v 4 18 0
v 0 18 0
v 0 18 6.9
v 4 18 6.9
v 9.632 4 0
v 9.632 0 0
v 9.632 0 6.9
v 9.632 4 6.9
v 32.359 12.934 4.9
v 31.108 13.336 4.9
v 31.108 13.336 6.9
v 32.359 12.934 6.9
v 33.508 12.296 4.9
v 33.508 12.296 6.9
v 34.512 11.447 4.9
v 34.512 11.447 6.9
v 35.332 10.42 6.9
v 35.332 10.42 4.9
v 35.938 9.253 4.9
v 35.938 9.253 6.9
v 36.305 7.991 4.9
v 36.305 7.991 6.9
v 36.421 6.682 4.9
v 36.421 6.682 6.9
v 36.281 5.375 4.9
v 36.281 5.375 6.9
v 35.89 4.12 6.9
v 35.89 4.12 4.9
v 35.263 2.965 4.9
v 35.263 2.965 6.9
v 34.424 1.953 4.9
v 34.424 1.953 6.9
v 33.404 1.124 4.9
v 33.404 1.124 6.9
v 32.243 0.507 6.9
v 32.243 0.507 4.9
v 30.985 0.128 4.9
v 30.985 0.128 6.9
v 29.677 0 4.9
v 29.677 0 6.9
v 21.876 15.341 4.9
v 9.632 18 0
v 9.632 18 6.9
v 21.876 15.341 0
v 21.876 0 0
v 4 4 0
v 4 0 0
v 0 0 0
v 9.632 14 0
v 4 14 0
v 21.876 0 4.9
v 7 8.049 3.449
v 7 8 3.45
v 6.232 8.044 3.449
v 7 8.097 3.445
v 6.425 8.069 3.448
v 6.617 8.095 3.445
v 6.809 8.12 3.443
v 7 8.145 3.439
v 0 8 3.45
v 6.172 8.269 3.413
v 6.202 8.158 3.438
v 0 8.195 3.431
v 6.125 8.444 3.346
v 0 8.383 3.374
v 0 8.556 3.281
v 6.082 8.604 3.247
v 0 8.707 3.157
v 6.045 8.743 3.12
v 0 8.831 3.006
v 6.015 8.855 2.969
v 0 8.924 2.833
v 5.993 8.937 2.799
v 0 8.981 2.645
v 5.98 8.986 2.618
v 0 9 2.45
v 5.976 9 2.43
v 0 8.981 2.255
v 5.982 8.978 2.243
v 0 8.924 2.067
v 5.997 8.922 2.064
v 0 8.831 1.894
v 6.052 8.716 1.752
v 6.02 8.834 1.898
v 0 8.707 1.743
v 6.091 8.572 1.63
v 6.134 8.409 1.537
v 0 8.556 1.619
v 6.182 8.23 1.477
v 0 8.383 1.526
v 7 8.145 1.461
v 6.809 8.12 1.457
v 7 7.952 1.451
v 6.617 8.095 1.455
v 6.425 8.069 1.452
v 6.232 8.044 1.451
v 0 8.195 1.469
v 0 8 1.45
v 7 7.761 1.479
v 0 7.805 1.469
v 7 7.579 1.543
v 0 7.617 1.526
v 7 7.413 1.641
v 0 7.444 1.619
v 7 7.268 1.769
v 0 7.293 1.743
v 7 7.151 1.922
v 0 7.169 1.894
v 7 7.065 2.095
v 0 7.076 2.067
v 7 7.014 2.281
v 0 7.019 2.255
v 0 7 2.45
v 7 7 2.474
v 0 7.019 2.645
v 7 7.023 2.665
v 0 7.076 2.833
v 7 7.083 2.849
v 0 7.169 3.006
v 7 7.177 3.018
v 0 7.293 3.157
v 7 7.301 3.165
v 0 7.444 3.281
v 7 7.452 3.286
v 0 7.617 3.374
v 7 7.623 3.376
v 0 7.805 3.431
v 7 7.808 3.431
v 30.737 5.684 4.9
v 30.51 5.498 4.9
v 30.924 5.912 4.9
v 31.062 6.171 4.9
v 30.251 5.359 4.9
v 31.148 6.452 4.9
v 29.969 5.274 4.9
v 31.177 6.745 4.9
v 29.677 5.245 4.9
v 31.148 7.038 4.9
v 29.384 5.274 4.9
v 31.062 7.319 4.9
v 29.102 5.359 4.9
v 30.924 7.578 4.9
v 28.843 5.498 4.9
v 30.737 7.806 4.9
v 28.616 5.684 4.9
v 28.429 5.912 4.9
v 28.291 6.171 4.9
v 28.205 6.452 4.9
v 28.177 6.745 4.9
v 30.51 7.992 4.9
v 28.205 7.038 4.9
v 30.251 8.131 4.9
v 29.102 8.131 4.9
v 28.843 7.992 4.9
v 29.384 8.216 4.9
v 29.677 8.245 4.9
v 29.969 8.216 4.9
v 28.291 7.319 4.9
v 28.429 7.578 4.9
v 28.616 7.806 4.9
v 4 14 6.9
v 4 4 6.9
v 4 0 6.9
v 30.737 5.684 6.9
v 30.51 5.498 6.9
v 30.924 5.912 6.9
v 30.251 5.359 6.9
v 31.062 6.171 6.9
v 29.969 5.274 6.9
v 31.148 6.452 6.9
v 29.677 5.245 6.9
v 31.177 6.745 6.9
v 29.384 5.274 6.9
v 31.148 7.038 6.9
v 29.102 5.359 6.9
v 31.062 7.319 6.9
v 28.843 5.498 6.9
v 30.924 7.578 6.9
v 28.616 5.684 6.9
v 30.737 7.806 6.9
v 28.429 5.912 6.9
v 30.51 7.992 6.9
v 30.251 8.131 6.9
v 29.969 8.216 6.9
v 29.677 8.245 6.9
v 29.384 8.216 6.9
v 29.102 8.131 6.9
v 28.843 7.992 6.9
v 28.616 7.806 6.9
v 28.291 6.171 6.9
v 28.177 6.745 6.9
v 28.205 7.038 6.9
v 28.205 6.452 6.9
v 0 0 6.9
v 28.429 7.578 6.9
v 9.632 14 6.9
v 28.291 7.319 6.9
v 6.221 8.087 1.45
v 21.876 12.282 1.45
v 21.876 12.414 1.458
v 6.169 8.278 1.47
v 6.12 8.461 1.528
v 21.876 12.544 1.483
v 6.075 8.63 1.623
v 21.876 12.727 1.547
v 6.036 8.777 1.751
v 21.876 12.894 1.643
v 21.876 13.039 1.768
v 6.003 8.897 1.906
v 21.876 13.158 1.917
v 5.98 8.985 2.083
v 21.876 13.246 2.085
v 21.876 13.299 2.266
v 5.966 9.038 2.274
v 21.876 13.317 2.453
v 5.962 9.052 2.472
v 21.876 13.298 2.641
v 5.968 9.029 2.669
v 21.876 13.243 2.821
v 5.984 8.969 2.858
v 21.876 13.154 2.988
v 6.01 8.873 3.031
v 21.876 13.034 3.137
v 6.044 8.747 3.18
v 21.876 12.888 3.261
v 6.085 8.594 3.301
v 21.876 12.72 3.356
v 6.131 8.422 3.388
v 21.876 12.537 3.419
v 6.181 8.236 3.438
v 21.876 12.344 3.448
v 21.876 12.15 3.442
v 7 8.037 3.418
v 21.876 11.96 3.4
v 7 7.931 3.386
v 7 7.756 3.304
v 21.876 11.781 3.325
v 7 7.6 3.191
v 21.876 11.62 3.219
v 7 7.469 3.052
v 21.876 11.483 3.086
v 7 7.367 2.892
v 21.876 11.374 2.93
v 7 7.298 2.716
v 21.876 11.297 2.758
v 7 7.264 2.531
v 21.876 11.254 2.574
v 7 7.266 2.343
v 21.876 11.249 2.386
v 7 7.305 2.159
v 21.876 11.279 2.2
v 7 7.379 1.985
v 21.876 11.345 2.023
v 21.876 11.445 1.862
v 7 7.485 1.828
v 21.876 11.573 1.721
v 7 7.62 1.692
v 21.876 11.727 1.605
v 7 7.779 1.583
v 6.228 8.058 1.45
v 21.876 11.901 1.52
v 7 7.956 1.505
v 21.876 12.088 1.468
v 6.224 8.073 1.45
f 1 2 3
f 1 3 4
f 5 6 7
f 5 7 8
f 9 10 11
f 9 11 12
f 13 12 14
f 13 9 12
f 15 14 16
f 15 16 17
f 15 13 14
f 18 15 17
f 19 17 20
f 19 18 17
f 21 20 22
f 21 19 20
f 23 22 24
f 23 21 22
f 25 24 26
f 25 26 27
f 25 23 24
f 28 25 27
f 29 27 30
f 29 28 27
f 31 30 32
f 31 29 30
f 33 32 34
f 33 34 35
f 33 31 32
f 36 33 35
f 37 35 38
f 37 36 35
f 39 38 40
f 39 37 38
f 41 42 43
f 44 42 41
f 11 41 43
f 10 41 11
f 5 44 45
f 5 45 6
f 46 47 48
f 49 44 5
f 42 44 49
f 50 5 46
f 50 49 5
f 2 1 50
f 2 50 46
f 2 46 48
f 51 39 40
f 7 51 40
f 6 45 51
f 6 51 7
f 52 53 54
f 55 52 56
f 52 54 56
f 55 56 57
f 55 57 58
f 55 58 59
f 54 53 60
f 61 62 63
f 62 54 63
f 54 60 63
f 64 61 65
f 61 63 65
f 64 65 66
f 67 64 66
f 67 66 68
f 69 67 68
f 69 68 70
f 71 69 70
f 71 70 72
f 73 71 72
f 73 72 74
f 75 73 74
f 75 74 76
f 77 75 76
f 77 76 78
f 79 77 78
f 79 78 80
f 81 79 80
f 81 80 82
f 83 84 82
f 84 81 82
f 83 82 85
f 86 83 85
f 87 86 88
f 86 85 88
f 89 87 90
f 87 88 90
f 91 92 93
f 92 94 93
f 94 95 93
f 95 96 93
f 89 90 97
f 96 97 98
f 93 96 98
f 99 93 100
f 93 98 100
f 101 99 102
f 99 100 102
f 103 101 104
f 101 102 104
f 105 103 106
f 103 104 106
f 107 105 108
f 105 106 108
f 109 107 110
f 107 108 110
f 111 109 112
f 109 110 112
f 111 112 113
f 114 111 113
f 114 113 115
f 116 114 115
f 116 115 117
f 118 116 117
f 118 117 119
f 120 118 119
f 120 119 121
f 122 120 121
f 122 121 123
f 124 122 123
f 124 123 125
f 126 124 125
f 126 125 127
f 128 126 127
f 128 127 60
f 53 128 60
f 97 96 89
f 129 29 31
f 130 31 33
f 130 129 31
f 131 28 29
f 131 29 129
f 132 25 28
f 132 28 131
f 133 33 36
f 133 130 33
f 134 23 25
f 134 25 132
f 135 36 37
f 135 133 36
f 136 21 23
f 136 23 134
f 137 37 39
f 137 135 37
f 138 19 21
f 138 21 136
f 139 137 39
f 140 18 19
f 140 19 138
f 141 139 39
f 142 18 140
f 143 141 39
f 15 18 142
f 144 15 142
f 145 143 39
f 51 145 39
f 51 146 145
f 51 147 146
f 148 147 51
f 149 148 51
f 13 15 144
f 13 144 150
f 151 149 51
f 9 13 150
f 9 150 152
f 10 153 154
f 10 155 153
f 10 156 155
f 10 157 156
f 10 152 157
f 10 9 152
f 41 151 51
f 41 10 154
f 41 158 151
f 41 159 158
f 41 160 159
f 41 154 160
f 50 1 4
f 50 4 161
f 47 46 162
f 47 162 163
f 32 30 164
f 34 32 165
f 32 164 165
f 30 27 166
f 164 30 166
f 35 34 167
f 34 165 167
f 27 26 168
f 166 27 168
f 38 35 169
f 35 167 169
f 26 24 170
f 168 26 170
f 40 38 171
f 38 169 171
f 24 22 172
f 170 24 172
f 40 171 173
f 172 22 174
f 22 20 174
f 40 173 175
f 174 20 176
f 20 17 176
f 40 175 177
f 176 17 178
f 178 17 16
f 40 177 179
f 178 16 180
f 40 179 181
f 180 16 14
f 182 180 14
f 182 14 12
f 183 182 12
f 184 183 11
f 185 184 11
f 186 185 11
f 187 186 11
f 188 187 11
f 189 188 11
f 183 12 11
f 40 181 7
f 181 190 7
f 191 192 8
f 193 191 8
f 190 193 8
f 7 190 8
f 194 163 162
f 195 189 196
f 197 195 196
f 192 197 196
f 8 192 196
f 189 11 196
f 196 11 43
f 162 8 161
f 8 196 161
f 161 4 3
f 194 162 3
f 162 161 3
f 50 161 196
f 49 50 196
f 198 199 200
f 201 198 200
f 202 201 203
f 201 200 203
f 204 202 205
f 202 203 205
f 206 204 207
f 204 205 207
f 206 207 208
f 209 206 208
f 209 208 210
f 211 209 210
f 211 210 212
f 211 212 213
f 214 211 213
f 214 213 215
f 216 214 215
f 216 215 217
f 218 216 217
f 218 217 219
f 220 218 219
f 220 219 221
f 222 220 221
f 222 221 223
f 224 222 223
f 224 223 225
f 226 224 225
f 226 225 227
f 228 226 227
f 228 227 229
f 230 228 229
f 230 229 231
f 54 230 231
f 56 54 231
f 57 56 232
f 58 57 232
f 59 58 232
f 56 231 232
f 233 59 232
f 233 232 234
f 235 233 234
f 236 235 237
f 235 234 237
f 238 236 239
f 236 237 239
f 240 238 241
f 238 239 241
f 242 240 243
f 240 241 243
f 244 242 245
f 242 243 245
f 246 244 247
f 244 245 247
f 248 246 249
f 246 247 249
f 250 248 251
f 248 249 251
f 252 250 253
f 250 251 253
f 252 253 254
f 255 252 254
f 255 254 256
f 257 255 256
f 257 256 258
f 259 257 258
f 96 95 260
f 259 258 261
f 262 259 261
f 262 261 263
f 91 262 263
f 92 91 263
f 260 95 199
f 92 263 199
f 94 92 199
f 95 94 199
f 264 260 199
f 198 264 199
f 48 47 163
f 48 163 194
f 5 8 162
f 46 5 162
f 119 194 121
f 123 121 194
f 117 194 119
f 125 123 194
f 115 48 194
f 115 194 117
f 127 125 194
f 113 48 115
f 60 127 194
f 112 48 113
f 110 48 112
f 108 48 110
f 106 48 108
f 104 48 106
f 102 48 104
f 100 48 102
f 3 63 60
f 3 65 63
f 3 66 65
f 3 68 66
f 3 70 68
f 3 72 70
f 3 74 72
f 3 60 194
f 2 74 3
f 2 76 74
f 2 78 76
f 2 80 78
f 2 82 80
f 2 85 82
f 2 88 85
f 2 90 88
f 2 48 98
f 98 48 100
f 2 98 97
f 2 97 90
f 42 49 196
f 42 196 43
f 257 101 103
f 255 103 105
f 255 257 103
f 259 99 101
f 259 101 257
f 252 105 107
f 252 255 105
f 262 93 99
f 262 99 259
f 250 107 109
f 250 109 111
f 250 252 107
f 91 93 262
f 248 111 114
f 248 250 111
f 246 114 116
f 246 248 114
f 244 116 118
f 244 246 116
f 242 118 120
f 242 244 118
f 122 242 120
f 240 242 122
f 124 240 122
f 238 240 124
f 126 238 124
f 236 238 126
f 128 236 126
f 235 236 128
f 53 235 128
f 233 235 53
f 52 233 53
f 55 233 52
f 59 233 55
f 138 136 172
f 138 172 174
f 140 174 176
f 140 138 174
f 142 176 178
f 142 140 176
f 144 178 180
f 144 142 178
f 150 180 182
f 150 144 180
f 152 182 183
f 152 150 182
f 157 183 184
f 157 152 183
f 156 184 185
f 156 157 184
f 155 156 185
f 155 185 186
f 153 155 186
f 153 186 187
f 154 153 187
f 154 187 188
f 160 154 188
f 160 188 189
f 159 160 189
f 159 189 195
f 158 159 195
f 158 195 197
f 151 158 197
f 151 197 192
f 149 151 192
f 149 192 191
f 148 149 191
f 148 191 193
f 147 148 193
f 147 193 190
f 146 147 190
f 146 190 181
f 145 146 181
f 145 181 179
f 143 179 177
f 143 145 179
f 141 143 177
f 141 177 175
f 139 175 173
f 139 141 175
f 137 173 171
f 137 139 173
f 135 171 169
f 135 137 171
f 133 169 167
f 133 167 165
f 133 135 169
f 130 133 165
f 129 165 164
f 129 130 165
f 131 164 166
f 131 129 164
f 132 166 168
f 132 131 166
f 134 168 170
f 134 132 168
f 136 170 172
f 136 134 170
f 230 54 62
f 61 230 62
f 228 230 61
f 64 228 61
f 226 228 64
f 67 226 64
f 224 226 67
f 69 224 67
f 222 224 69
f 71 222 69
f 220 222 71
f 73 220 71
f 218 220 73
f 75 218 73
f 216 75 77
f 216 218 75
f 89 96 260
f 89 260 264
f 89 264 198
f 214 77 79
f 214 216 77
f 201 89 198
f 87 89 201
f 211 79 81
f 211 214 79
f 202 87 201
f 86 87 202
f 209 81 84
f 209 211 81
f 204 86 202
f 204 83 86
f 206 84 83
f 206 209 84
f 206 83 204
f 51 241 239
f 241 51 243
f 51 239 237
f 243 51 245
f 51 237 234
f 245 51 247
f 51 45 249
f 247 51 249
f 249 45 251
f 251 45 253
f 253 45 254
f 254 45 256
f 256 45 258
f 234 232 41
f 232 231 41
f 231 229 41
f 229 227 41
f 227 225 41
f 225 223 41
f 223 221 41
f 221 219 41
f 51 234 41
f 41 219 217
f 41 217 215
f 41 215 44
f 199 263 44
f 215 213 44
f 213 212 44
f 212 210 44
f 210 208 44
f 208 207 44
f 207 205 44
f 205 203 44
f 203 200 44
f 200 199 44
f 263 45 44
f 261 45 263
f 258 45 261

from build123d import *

# Parameters (mm, degrees)
SKETCH1_R           = 1.5
BOSS_EXTRUDE1_DEPTH = 6.9
CUT_EXTRUDE2_DEPTH  = 4.9
SKETCH5_R           = 1
CUT_EXTRUDE3_DEPTH  = 7
SKETCH8_R           = 1
CUT_EXTRUDE5_DEPTH  = 17


with BuildPart() as part:
    # Sketch1 → Boss-Extrude1 (new body)
    with BuildSketch(Plane.XY):
        with BuildLine():
            Line((0, 0), (0, 18.000341084))
            Line((0, 18.000341084), (4, 18.000341084))
            Line((4, 18.000341084), (4, 14.000341084))
            Line((4, 14.000341084), (9.631516349, 14.000341084))
            Line((9.631516349, 14.000341084), (9.631516349, 18.000341084))
            Line((9.631516349, 18.000341084), (31.10792826, 13.336453737))
            ThreePointArc((31.10792826, 13.336453737), (36.383041872, 6.025227564), (29.676516349, 0))
            Line((29.676516349, 0), (9.631516349, 0))
            Line((9.631516349, 0), (9.631516349, 4))
            Line((9.631516349, 4), (4, 4))
            Line((4, 4), (4, 0))
            Line((4, 0), (0, 0))
        make_face()
        with Locations((29.676516349, 6.745044143)):
            Circle(SKETCH1_R, mode=Mode.SUBTRACT)
    extrude(amount=BOSS_EXTRUDE1_DEPTH)

    # Sketch4 → Cut-Extrude2 (cut)
    with BuildSketch(Plane.XY):
        with BuildLine():
            Line((21.876472206, 0), (21.876472206, 15.341186709))
            Line((21.876472206, 15.341186709), (31.10792826, 13.336453737))
            ThreePointArc((31.10792826, 13.336453737), (36.383041872, 6.025227564), (29.676516349, 0))
            Line((29.676516349, 0), (21.876472206, 0))
        make_face()
    extrude(amount=CUT_EXTRUDE2_DEPTH, mode=Mode.SUBTRACT)

    # Sketch5 → Cut-Extrude3 (cut)
    with BuildSketch(Plane.ZY):
        with Locations((2.45, 8)):
            Circle(SKETCH5_R)
    extrude(amount=-CUT_EXTRUDE3_DEPTH, mode=Mode.SUBTRACT)

    # Sketch8 → Cut-Extrude5 (cut)
    with BuildSketch(Plane(origin=(24.246323118, 6.496782699, 0), x_dir=(0, 0, -1), z_dir=(0.965925826, 0.258819045, 0))):
        with Locations((-2.45, 6.201190468)):
            Circle(SKETCH8_R)
    extrude(amount=-CUT_EXTRUDE5_DEPTH, mode=Mode.SUBTRACT)


solid = part.part
